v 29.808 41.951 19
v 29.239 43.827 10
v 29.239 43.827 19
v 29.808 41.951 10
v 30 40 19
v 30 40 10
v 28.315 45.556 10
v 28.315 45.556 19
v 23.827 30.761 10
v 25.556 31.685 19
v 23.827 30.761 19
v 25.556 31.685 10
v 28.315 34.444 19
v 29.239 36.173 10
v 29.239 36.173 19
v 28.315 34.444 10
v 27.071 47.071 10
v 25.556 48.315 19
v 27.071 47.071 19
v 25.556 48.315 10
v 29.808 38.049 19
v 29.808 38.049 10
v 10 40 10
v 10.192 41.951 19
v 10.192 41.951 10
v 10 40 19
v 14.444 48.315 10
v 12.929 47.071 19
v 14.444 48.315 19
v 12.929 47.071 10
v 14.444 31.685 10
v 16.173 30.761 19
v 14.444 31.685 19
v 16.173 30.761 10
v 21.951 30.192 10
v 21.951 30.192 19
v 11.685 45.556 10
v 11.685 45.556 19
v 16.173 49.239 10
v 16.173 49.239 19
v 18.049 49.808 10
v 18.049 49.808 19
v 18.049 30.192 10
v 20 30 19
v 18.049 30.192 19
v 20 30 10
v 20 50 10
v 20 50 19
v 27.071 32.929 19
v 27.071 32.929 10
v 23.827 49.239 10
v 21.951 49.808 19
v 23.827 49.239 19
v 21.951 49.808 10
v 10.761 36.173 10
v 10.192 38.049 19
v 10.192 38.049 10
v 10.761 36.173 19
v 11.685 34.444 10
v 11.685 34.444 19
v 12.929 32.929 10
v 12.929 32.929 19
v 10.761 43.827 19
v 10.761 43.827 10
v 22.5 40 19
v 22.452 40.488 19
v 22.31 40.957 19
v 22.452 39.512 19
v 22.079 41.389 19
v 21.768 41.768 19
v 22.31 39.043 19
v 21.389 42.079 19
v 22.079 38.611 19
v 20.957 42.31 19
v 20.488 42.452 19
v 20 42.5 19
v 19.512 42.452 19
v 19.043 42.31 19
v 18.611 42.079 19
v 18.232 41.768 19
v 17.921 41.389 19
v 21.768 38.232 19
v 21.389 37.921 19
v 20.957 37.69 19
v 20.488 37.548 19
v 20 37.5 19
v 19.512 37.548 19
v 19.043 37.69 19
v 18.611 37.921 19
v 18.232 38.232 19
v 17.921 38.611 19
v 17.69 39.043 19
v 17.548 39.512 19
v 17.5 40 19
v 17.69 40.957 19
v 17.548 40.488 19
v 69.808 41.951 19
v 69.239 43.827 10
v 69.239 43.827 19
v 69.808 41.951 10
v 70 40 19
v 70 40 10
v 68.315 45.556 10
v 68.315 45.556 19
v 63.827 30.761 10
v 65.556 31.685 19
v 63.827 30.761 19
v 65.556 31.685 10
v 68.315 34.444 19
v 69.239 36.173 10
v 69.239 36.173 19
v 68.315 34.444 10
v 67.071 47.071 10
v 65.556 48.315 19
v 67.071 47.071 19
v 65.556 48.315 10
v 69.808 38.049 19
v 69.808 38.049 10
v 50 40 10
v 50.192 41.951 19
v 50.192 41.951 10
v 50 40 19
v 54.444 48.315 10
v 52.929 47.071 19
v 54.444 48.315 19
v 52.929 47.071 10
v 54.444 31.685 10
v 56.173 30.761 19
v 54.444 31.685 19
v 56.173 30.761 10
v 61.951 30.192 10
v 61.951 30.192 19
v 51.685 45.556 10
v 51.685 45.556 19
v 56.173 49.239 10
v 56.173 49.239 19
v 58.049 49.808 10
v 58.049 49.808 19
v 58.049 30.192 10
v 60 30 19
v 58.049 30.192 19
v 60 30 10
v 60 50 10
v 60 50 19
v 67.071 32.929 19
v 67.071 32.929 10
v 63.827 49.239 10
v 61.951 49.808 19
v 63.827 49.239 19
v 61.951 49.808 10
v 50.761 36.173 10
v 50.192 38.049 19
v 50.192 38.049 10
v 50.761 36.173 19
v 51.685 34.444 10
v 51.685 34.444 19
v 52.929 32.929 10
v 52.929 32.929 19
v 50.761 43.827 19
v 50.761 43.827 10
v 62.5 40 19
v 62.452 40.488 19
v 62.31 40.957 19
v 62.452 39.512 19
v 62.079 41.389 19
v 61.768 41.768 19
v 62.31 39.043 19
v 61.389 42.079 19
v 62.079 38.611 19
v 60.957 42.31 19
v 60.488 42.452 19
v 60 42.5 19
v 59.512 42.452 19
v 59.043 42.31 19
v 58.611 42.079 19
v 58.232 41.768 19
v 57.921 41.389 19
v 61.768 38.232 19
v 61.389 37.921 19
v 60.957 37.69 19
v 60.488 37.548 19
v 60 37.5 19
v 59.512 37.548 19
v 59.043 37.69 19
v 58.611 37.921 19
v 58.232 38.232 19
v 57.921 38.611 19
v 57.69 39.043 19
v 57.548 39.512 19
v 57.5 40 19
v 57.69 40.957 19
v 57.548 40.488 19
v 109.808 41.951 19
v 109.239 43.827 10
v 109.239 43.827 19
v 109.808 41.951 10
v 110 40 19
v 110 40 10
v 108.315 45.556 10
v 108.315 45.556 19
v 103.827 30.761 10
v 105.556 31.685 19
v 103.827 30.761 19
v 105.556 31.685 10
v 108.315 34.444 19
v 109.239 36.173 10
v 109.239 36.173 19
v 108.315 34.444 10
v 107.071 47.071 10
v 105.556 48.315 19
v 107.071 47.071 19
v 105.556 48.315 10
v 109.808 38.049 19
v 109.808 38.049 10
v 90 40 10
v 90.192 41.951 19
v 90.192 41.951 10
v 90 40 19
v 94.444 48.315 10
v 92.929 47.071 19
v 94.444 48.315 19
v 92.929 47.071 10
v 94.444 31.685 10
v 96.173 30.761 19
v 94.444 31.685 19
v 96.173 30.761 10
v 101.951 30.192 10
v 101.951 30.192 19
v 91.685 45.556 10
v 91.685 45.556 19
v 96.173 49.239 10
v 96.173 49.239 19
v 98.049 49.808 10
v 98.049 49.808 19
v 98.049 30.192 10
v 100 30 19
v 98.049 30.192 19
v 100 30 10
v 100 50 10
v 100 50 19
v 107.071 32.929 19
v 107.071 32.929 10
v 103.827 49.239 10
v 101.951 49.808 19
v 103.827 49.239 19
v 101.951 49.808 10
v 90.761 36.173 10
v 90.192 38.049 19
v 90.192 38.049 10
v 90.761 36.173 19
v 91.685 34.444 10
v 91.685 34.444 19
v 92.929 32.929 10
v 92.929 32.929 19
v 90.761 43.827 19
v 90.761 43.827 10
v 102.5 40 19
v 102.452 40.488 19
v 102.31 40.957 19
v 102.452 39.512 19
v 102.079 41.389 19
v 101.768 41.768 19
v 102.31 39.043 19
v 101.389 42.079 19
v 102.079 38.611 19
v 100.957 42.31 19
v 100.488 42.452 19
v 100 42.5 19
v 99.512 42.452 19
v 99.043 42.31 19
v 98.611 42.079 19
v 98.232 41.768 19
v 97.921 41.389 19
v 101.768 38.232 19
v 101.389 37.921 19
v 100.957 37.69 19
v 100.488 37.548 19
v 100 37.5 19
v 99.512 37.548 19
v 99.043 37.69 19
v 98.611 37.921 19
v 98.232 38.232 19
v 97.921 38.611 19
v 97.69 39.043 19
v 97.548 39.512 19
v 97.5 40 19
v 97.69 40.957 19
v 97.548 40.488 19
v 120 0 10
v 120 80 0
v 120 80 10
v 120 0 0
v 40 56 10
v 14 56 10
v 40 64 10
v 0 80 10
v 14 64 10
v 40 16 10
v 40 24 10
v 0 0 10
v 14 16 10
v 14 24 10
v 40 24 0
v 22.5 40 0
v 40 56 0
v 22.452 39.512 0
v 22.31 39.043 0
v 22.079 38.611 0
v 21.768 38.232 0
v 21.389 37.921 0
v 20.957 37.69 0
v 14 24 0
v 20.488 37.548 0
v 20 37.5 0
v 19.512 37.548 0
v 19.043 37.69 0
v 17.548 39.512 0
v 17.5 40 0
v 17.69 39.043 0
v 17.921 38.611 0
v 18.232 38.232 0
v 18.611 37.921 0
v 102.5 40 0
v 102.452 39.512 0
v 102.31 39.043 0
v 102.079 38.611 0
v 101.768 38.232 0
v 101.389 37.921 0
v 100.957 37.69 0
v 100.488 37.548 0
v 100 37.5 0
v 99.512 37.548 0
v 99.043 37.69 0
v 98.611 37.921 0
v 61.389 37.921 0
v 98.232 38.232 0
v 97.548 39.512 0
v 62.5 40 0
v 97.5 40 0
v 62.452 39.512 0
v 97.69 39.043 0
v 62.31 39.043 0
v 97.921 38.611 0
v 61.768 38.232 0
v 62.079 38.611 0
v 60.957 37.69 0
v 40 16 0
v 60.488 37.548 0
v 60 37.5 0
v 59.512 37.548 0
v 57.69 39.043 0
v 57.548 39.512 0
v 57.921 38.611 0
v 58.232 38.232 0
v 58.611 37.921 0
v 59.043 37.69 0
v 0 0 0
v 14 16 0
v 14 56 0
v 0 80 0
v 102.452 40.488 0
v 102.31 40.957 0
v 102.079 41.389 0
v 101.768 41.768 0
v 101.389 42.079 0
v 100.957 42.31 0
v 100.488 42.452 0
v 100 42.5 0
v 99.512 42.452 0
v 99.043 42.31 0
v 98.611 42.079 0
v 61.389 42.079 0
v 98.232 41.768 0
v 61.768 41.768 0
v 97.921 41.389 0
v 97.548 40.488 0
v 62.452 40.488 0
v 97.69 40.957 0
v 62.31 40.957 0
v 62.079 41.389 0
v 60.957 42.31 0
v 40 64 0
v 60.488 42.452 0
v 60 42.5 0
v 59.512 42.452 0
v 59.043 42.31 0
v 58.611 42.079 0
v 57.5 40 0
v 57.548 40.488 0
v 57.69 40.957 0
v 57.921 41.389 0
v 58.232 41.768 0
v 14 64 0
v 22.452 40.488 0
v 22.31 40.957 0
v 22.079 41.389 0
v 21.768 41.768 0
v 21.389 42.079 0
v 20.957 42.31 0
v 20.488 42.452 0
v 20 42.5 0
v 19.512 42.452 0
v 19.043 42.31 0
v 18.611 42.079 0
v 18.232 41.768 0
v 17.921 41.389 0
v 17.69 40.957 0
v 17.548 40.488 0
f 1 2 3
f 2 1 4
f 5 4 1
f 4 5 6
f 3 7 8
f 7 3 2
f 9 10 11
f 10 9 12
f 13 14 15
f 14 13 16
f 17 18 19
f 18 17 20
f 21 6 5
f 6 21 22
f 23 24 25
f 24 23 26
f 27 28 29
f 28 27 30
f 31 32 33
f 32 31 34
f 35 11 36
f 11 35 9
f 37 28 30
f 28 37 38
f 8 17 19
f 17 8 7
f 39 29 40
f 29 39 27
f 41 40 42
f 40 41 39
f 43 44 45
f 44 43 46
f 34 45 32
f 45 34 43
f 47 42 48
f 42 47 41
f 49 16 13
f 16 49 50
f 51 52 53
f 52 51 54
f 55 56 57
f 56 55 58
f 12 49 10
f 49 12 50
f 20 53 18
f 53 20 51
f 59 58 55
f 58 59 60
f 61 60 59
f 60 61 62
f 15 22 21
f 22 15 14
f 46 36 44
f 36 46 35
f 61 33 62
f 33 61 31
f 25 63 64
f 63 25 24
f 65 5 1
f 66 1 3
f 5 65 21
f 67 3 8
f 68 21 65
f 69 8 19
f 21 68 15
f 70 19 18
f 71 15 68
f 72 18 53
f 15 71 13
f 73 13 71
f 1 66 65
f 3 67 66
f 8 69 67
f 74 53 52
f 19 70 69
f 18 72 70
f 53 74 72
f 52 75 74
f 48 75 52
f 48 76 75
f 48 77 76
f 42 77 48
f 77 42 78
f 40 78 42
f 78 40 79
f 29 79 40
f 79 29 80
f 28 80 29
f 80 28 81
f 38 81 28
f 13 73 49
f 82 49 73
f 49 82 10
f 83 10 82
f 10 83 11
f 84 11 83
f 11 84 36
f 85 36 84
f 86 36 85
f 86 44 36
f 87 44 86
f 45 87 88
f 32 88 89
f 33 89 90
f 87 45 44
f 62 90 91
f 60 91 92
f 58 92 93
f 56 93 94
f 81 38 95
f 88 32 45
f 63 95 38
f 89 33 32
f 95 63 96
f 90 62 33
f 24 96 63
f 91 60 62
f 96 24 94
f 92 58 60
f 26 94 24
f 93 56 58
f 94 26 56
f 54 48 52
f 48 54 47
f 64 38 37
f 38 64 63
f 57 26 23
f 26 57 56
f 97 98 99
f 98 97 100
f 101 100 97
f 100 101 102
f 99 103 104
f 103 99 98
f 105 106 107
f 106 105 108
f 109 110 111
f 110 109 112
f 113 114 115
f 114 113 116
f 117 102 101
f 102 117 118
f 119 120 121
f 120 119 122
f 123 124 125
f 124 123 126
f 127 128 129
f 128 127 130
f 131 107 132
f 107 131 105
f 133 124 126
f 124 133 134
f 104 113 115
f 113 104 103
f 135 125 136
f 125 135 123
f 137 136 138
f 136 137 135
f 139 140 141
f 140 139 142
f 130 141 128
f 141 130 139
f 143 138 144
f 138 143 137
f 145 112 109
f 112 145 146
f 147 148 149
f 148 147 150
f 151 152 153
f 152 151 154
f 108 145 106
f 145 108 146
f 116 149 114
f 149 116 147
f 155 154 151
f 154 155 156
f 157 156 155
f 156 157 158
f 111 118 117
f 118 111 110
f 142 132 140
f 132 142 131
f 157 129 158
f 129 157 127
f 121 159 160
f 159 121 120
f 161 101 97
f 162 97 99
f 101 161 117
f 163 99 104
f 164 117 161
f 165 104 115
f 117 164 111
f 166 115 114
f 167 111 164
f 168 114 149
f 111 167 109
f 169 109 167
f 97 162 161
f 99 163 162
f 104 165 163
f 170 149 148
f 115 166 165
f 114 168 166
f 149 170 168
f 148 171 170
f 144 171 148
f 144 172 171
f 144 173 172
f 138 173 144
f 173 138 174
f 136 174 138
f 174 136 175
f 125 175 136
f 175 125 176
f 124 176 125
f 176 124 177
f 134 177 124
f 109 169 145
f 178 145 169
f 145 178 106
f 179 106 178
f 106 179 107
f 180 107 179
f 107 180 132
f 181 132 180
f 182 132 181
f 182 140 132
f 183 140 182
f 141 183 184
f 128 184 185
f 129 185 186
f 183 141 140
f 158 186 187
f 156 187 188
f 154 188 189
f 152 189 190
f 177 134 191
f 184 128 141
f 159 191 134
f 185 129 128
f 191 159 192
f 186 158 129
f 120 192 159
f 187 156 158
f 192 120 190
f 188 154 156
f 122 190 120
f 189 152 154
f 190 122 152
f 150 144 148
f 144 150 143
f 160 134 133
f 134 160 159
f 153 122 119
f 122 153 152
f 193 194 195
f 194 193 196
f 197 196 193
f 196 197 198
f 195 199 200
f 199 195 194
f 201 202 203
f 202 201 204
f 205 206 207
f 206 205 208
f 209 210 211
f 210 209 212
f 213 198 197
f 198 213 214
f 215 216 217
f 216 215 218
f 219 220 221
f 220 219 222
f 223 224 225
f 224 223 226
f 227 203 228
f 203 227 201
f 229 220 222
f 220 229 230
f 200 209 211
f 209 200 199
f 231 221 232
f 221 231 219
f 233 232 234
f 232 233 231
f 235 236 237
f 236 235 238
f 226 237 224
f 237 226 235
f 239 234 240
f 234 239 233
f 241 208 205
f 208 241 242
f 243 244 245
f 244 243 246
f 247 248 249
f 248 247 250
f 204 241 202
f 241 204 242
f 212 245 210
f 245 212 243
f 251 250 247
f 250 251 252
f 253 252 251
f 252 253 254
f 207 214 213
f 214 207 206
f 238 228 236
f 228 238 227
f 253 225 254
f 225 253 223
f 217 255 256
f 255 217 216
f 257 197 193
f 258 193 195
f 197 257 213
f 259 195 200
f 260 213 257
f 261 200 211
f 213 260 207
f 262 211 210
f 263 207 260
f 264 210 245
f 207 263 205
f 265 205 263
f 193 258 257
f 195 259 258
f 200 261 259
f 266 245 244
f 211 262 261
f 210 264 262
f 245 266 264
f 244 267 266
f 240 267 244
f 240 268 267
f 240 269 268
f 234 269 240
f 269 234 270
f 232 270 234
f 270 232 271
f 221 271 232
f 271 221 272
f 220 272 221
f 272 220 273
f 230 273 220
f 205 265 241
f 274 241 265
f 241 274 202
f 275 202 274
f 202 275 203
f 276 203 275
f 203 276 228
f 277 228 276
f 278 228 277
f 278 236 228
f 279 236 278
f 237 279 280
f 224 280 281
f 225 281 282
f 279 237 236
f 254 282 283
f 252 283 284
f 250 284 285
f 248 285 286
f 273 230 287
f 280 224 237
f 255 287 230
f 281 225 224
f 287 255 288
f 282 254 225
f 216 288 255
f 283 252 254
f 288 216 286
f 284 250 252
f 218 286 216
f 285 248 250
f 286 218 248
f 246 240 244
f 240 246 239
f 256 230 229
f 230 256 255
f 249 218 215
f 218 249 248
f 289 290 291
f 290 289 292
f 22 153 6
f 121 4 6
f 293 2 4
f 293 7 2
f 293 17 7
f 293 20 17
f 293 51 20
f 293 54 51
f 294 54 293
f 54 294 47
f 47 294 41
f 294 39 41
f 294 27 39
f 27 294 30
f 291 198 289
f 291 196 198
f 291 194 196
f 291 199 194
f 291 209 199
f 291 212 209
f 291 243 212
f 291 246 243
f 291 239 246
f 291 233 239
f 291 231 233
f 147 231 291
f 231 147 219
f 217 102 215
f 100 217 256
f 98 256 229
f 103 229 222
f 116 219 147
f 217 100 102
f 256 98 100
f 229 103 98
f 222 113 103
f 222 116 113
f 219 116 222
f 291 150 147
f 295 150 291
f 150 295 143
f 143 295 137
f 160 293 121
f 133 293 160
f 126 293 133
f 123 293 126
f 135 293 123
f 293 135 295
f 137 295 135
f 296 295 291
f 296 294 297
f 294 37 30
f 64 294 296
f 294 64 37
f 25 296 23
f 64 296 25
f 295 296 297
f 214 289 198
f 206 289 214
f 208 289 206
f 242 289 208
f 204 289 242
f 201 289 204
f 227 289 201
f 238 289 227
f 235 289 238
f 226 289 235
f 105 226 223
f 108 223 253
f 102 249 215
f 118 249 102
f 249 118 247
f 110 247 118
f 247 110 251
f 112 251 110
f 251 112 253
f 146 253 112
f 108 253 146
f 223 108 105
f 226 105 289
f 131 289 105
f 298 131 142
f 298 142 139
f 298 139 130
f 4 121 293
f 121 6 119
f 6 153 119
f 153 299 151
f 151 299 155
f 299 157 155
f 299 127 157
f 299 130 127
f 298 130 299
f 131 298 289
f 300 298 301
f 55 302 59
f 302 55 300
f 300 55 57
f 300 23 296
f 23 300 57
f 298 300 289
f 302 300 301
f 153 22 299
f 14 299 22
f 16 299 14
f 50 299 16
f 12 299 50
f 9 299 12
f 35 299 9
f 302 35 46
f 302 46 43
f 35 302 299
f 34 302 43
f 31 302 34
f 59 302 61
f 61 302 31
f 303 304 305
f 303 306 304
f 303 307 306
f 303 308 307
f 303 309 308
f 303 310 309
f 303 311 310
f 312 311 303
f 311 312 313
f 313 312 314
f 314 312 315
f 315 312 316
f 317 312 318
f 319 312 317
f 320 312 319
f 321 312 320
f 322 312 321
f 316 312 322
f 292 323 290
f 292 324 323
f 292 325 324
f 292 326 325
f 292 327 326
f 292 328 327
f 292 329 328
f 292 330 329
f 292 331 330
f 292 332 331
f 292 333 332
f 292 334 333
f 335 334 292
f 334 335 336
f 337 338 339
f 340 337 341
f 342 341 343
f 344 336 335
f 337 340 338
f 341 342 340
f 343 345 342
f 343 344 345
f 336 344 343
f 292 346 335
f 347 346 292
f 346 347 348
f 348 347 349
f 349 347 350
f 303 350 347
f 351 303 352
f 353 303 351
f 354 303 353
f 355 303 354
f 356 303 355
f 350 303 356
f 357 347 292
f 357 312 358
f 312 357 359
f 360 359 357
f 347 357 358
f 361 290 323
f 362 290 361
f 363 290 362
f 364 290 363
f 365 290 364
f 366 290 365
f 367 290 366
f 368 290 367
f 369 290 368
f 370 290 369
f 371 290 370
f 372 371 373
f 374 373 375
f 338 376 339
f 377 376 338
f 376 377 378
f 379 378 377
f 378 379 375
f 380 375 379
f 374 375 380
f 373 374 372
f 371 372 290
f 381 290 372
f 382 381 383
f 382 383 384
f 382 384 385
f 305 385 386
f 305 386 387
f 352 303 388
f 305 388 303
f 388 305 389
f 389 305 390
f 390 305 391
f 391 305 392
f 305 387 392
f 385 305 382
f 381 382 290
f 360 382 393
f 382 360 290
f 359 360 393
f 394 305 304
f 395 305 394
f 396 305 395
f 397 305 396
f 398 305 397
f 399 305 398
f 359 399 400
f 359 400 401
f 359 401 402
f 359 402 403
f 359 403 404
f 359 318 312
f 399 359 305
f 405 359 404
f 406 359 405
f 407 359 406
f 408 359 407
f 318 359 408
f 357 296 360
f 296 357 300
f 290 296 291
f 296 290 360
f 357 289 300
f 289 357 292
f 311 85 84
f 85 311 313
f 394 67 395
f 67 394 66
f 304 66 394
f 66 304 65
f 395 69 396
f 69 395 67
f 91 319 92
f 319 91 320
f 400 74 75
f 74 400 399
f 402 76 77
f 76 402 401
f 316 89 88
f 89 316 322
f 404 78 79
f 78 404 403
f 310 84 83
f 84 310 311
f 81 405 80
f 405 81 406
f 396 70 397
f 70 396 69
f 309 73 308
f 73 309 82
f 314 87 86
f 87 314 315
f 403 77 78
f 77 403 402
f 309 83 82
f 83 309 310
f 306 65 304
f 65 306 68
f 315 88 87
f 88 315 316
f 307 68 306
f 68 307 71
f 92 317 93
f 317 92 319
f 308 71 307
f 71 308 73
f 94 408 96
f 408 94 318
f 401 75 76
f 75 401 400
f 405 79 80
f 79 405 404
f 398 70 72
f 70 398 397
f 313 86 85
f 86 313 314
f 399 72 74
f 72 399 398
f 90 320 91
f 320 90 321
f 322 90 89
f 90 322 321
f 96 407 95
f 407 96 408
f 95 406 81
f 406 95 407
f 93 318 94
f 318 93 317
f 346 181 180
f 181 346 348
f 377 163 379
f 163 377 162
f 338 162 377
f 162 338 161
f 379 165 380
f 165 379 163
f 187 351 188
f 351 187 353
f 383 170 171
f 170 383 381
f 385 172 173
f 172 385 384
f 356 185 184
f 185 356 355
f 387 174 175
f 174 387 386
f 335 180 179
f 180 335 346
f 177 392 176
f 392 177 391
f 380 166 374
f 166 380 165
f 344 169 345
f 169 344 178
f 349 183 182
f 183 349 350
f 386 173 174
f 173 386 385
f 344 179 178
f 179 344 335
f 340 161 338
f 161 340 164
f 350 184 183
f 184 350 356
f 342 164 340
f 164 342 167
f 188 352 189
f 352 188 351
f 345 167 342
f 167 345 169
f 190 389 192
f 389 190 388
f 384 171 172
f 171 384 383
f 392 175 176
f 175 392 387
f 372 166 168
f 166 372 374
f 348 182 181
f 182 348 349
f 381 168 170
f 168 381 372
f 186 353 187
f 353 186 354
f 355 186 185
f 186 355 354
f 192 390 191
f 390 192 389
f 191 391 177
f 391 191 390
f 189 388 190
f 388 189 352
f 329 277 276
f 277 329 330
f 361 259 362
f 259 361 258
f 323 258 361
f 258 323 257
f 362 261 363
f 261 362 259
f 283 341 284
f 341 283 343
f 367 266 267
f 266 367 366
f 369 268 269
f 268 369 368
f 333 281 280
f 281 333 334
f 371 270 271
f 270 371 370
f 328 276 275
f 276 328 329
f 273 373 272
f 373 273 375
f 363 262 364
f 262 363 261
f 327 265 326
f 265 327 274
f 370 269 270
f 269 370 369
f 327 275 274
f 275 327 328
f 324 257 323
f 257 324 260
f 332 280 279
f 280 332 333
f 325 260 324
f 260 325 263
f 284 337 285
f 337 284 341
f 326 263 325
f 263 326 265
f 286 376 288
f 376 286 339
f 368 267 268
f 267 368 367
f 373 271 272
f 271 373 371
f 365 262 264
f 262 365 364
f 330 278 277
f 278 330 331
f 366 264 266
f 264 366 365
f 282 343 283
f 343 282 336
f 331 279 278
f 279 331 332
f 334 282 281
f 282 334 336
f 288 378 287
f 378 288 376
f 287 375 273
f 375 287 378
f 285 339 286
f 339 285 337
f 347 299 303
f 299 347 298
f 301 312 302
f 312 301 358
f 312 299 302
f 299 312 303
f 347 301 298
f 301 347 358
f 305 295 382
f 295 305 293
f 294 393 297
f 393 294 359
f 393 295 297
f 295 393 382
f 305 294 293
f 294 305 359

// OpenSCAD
$fn = 32;

// ----------------------------------------------------------------------
// Drill jig: three_boss_slot jig
// ----------------------------------------------------------------------

// --- parameters (mm) ---
plate_l = 120;            // plate length, X
plate_w = 80;             // plate width, Y
plate_t = 10;             // plate thickness
boss_d = 20;              // guide boss diameter
boss_h = 10;              // boss height above the plate
guide_d = 5;              // guide hole diameter
boss_pitch = 40;          // boss pitch
slot_w = 8;               // clamp slot width
slot_l = 26;              // clamp slot length
slot_x = 14;              // slot start X
fit_tol = 0.05;           // tolerance for press fits, mm
free_tol = 0.2;           // tolerance for clearance fits, mm

n_boss = 3;  // guide bosses
boss_x0 = (plate_l - (n_boss - 1) * boss_pitch) / 2;  // first boss X
boss_top = plate_t - 1 + boss_h;  // boss crown height
total_h = boss_top;  // overall height

difference() {
  union() {
  cube([plate_l, plate_w, plate_t]);
  for (i = [0 : n_boss - 1])
    translate([boss_x0 + i * boss_pitch, plate_w / 2, plate_t - 1])
      cylinder(h = boss_h, d = boss_d);
  }
  for (i = [0 : n_boss - 1])
    translate([boss_x0 + i * boss_pitch, plate_w / 2, -1])
      cylinder(h = plate_t + boss_h, d = guide_d);
  for (cy = [plate_w * 0.25, plate_w * 0.75])
    translate([slot_x, cy - slot_w / 2, -1])
      cube([slot_l, slot_w, plate_t + 2]);
}
